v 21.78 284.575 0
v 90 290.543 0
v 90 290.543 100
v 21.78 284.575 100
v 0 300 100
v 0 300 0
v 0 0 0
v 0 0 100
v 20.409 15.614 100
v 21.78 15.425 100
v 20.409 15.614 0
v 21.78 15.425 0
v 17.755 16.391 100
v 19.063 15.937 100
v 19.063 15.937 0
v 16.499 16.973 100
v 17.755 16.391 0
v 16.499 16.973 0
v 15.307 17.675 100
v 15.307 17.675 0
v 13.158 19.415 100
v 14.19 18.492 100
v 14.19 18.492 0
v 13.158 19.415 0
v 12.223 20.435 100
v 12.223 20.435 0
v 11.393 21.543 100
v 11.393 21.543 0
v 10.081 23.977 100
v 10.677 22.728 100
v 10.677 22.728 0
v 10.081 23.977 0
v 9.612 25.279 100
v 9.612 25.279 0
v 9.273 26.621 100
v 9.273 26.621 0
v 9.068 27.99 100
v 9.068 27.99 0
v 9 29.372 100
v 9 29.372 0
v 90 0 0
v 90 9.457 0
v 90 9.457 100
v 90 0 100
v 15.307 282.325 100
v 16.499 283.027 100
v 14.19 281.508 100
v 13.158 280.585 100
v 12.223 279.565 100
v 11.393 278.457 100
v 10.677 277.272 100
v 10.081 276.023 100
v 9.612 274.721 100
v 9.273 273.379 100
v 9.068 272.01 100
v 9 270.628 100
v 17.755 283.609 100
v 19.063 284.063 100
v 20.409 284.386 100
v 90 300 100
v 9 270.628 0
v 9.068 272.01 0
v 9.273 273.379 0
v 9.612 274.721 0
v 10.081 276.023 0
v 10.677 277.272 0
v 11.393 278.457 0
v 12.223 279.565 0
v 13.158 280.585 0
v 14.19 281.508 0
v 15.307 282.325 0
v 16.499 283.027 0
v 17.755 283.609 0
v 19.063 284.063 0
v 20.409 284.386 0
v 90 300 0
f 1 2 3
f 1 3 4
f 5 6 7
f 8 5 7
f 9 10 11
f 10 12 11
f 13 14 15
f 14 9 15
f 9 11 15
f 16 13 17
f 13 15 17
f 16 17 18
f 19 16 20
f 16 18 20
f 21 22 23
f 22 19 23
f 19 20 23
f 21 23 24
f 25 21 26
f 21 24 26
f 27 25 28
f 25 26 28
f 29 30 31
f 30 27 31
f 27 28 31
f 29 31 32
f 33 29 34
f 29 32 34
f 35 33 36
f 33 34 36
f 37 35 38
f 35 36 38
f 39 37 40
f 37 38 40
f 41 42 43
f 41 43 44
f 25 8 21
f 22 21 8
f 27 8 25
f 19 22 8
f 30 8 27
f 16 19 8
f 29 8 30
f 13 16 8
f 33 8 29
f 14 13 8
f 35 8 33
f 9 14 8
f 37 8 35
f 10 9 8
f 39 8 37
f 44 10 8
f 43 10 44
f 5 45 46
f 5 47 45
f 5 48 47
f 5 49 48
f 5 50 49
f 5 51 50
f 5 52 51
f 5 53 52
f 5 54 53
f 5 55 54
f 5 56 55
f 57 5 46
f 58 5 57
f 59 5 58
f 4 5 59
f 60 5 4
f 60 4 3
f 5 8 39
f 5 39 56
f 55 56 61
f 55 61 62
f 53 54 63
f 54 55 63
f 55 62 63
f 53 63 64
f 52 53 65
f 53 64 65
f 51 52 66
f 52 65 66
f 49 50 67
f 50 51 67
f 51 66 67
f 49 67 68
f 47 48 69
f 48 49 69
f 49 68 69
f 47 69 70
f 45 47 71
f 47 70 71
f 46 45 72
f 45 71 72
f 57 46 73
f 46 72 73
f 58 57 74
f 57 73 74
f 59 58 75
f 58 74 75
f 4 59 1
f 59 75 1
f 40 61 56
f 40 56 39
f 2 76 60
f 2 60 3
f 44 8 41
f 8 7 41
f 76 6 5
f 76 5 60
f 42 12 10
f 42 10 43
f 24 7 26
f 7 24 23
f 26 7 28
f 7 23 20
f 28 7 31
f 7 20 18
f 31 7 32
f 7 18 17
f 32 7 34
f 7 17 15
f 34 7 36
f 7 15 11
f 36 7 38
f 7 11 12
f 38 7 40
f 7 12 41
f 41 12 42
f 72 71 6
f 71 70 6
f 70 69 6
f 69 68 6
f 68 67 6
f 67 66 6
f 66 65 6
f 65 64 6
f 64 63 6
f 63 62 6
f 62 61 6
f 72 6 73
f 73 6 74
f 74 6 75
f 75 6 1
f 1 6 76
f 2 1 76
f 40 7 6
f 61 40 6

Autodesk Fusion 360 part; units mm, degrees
sketch "スケッチ1" plane through (0, 0, 0) normal (0, 0, 1) x (1, 0, 0)
  line L0 (0, 0) -> (90, 0)
  line L1 (21.7798, 15.4252) -> (90, 9.4567)
  line L2 (90, 290.5433) -> (21.7798, 284.5748)
  line L3 (0, 300) -> (90, 300)
  line L4 (9, 270.6281) -> (9, 29.3719)
  line L5 (0, 300) -> (0, 0)
  arc A0 (9, 29.3719) -> (21.7798, 15.4252) centre (23, 29.3719) ccw
  arc A1 (21.7798, 284.5748) -> (9, 270.6281) centre (23, 270.6281) ccw
  line L6 (90, 9.4567) -> (90, 0)
  line L7 (90, 300) -> (90, 290.5433)
extrude "押し出し1" add sketch "スケッチ1" along normal blind 100
